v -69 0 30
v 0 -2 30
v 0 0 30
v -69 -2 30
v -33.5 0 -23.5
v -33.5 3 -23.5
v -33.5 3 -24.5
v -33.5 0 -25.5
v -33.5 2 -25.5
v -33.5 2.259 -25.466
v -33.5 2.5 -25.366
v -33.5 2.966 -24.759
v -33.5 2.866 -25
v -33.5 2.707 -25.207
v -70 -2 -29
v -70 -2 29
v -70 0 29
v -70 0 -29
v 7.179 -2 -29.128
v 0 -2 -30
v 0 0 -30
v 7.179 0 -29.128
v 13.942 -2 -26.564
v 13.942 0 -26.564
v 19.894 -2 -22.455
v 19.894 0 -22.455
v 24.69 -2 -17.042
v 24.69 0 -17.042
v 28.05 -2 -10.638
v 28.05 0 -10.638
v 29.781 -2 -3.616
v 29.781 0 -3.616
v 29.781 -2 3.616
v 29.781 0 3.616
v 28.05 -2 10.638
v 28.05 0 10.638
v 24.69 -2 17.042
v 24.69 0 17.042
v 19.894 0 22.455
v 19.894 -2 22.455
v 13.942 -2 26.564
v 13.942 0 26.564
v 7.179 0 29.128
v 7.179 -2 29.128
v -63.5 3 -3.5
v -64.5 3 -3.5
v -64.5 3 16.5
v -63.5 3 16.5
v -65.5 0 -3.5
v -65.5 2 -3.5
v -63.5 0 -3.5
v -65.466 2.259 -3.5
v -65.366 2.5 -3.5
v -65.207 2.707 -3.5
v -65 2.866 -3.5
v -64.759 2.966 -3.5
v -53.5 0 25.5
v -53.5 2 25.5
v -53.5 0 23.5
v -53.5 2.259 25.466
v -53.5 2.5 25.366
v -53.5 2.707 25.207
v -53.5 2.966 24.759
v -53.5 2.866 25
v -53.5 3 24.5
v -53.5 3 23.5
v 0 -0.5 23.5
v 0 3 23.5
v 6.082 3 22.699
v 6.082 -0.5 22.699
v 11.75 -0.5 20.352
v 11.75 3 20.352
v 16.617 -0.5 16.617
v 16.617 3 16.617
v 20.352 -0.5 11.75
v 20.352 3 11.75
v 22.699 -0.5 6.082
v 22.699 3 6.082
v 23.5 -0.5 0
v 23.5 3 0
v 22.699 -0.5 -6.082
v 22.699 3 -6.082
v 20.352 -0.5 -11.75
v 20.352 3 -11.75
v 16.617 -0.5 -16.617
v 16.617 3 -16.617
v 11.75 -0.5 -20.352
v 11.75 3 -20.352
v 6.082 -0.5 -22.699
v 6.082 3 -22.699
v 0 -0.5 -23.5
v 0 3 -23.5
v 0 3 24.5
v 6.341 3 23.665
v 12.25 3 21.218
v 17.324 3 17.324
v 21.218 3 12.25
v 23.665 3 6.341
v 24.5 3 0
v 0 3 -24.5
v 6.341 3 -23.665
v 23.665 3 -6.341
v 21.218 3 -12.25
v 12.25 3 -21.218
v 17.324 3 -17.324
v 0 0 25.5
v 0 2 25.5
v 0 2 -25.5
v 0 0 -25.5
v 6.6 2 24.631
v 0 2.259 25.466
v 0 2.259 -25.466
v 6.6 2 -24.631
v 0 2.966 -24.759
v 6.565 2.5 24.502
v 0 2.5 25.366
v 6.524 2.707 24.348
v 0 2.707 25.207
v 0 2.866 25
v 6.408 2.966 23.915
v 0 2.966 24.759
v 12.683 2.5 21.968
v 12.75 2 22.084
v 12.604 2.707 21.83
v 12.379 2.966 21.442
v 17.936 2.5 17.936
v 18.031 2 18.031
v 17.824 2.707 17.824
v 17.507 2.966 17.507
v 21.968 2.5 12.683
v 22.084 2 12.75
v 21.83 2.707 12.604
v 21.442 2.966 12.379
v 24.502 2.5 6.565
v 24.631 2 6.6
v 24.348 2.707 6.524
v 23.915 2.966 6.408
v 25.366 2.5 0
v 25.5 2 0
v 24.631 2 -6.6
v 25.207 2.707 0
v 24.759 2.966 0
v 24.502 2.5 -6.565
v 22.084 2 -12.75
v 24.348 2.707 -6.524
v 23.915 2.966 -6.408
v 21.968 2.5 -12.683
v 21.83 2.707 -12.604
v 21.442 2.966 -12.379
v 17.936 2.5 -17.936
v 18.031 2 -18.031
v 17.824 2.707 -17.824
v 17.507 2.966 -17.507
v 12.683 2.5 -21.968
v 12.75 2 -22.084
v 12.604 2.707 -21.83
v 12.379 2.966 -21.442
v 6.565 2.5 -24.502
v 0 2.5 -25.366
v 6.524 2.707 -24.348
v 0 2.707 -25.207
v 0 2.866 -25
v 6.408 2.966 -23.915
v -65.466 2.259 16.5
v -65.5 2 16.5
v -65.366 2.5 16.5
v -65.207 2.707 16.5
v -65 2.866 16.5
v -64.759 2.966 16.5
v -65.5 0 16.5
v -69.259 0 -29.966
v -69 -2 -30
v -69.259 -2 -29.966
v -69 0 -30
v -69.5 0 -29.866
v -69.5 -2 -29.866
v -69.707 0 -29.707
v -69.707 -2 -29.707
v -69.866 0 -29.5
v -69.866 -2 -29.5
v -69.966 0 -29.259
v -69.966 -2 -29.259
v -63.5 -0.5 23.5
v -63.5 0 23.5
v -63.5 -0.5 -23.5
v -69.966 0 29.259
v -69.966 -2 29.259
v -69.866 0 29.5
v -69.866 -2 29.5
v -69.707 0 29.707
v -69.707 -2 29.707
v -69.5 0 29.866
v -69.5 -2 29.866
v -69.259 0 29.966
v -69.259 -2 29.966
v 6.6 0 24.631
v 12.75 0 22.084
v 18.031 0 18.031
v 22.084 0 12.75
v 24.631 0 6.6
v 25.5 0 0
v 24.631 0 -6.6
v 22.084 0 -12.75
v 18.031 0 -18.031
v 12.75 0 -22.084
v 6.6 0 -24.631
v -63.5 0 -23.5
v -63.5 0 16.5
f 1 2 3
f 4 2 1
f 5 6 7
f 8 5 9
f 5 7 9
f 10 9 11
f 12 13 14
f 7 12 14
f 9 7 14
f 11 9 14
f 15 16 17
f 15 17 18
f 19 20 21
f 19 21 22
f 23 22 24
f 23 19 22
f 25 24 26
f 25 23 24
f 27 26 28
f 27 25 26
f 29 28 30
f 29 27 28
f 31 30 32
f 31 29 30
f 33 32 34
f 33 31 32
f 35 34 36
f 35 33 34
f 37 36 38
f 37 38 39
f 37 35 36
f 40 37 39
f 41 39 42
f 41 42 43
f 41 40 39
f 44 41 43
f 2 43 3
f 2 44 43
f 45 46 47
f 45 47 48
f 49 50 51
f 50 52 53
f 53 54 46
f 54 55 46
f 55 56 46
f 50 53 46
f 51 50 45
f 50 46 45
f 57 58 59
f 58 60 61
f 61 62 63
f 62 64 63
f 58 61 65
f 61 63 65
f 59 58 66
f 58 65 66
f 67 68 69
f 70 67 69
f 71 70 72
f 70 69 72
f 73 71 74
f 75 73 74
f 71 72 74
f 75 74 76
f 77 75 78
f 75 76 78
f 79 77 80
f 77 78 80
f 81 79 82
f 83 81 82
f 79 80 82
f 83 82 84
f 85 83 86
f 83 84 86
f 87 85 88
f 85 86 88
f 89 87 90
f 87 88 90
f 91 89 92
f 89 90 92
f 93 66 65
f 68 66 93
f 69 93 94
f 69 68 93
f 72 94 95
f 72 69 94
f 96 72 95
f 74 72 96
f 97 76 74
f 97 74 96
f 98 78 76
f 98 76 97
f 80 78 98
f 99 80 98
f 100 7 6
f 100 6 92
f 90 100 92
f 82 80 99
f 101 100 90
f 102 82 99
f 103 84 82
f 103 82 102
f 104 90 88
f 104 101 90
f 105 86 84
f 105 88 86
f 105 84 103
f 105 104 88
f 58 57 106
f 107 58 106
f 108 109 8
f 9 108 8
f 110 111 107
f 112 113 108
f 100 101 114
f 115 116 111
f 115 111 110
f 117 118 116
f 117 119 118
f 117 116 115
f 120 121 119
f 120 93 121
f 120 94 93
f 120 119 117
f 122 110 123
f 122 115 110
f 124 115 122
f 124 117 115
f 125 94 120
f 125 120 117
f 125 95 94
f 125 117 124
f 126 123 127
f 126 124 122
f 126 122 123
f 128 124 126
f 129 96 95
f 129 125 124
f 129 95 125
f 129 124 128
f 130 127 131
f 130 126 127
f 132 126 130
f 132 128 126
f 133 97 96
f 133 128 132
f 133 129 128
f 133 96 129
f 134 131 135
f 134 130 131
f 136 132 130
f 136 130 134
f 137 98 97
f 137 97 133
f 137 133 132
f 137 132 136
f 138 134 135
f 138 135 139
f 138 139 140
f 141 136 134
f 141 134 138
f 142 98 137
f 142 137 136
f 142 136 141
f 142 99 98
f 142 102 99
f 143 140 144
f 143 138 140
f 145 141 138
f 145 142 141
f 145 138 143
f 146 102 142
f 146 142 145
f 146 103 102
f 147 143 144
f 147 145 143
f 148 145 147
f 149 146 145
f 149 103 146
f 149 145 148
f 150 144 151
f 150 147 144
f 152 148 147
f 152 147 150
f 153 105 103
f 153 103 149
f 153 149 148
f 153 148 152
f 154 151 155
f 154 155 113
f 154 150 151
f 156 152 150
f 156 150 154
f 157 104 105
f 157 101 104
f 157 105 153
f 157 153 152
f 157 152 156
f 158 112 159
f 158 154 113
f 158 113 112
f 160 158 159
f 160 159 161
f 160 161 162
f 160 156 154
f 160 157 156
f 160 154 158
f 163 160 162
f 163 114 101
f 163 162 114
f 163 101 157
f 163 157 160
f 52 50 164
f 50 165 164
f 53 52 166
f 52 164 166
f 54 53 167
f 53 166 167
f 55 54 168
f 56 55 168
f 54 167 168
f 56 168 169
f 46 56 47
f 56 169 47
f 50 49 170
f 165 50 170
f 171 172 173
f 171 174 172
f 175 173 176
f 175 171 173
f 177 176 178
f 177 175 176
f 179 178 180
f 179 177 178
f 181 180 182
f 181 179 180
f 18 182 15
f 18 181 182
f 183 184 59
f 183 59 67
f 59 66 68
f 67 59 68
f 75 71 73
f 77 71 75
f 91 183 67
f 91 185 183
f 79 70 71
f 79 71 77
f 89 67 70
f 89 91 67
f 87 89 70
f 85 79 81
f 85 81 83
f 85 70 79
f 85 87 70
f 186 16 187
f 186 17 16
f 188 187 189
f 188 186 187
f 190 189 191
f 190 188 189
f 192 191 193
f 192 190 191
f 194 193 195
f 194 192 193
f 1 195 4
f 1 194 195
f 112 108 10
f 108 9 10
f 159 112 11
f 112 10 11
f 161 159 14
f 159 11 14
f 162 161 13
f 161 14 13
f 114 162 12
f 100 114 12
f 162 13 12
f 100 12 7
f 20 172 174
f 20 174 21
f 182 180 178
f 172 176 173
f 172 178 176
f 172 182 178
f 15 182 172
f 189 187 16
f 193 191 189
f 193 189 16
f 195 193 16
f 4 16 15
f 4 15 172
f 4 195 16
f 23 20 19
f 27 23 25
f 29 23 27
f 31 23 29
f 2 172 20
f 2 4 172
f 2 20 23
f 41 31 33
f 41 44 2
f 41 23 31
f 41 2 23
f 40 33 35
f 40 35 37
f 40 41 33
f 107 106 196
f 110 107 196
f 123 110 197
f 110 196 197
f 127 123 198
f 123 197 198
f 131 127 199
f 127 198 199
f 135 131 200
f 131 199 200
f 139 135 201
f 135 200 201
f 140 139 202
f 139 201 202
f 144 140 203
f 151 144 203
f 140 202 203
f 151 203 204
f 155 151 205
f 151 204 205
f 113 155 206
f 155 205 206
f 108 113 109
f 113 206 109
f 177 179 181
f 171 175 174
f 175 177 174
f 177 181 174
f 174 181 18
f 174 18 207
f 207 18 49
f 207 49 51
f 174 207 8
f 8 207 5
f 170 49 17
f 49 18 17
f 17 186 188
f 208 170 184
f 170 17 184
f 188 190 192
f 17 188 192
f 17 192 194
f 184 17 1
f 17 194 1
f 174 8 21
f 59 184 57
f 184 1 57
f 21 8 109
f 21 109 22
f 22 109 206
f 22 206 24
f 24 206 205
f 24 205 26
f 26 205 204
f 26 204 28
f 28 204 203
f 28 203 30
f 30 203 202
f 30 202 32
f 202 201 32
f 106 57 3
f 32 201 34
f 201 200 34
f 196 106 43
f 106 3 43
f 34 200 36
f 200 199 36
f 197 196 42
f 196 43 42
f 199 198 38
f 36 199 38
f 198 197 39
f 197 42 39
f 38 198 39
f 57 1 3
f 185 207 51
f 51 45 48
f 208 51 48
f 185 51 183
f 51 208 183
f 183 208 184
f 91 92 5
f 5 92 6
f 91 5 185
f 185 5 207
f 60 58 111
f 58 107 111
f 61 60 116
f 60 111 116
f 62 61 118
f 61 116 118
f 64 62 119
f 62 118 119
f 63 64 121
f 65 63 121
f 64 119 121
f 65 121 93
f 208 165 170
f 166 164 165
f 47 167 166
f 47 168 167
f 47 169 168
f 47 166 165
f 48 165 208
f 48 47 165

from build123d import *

# Parameters (mm, degrees)
BOSS_EXTRUDE1_DEPTH = 3
BOSS_EXTRUDE2_START = 2
BOSS_EXTRUDE2_DEPTH = 2
CUT_EXTRUDE1_DEPTH  = 3.5
FILLET1_R           = 1
SKETCH5_W           = 12
SKETCH5_H           = 9
SKETCH5_W_2         = 32
SKETCH5_H_2         = 22
CUT_EXTRUDE4_DEPTH  = 3
FILLET8_R           = 1
FILLET9_R           = 1


with BuildPart() as part:
    # Sketch1 → Boss-Extrude1 (new body)
    with BuildSketch(Plane(origin=(0, 0, 0), x_dir=(1, 0, 0), z_dir=(0, 1, 0))):
        with BuildLine():
            Line((-65.5, -25.5), (0, -25.5))
            ThreePointArc((0, -25.5), (25.5, 0), (0, 25.5))
            Line((0, 25.5), (-65.5, 25.5))
            Line((-65.5, 25.5), (-65.5, -25.5))
        make_face()
    extrude(amount=BOSS_EXTRUDE1_DEPTH)

    # Sketch2 → Boss-Extrude2 (add)
    # profile 1 of 2: a face of its own
    with BuildSketch(Plane.XZ.offset(BOSS_EXTRUDE2_START)):
        with BuildLine():
            Line((-70, -30), (0, -30))
            ThreePointArc((0, -30), (30, 0), (0, 30))
            Line((0, 30), (-70, 30))
            Line((-70, 30), (-70, -30))
        make_face()
        with BuildLine():
            Line((0, 25.5), (-65.5, 25.5))
            Line((-65.5, 25.5), (-65.5, -25.5))
            Line((-65.5, -25.5), (0, -25.5))
            ThreePointArc((0, -25.5), (25.5, 0), (0, 25.5))
        make_face(mode=Mode.SUBTRACT)
    # profile 2 of 2: a face of its own
    with BuildSketch(Plane.XZ.offset(BOSS_EXTRUDE2_START)):
        with BuildLine():
            ThreePointArc((0, -25.5), (25.5, 0), (0, 25.5))
            Line((0, 25.5), (-65.5, 25.5))
            Line((-65.5, 25.5), (-65.5, -25.5))
            Line((-65.5, -25.5), (0, -25.5))
        make_face()
    extrude(amount=-BOSS_EXTRUDE2_DEPTH)

    # Sketch4 → Cut-Extrude1 (cut)
    with BuildSketch(Plane(origin=(0, 3, 0), x_dir=(1, 0, 0), z_dir=(0, 1, 0))):
        with BuildLine():
            Line((-63.5, -23.5), (0, -23.5))
            ThreePointArc((0, -23.5), (23.5, 0), (0, 23.5))
            Line((0, 23.5), (-63.5, 23.5))
            Line((-63.5, 23.5), (-63.5, -23.5))
        make_face()
    extrude(amount=-CUT_EXTRUDE1_DEPTH, mode=Mode.SUBTRACT)

    # Fillet1
    fillet1_edges = [part.edges().sort_by_distance(p)[0] for p in [
        (-70, -1, -30),
        (-70, -1, 30),
    ]]
    fillet(fillet1_edges, radius=FILLET1_R)

    # Sketch5 → Cut-Extrude4 (cut)
    with BuildSketch(Plane(origin=(0, 3, 0), x_dir=(1, 0, 0), z_dir=(0, 1, 0))):
        with Locations((-59.5, -21)):
            Rectangle(SKETCH5_W, SKETCH5_H)
        with Locations((-49.5, 14.5)):
            Rectangle(SKETCH5_W_2, SKETCH5_H_2)
    extrude(amount=-CUT_EXTRUDE4_DEPTH, mode=Mode.SUBTRACT)

    # Fillet8
    fillet8_edges = [part.edges().sort_by_distance(p)[0] for p in [
        (-65.5, 3, 6.5),
    ]]
    fillet(fillet8_edges, radius=FILLET8_R)

    # Fillet9
    fillet9_edges = [part.edges().sort_by_distance(p)[0] for p in [
        (25.5, 3, 0),
        (-16.75, 3, -25.5),
        (-26.75, 3, 25.5),
    ]]
    fillet(fillet9_edges, radius=FILLET9_R)


solid = part.part
